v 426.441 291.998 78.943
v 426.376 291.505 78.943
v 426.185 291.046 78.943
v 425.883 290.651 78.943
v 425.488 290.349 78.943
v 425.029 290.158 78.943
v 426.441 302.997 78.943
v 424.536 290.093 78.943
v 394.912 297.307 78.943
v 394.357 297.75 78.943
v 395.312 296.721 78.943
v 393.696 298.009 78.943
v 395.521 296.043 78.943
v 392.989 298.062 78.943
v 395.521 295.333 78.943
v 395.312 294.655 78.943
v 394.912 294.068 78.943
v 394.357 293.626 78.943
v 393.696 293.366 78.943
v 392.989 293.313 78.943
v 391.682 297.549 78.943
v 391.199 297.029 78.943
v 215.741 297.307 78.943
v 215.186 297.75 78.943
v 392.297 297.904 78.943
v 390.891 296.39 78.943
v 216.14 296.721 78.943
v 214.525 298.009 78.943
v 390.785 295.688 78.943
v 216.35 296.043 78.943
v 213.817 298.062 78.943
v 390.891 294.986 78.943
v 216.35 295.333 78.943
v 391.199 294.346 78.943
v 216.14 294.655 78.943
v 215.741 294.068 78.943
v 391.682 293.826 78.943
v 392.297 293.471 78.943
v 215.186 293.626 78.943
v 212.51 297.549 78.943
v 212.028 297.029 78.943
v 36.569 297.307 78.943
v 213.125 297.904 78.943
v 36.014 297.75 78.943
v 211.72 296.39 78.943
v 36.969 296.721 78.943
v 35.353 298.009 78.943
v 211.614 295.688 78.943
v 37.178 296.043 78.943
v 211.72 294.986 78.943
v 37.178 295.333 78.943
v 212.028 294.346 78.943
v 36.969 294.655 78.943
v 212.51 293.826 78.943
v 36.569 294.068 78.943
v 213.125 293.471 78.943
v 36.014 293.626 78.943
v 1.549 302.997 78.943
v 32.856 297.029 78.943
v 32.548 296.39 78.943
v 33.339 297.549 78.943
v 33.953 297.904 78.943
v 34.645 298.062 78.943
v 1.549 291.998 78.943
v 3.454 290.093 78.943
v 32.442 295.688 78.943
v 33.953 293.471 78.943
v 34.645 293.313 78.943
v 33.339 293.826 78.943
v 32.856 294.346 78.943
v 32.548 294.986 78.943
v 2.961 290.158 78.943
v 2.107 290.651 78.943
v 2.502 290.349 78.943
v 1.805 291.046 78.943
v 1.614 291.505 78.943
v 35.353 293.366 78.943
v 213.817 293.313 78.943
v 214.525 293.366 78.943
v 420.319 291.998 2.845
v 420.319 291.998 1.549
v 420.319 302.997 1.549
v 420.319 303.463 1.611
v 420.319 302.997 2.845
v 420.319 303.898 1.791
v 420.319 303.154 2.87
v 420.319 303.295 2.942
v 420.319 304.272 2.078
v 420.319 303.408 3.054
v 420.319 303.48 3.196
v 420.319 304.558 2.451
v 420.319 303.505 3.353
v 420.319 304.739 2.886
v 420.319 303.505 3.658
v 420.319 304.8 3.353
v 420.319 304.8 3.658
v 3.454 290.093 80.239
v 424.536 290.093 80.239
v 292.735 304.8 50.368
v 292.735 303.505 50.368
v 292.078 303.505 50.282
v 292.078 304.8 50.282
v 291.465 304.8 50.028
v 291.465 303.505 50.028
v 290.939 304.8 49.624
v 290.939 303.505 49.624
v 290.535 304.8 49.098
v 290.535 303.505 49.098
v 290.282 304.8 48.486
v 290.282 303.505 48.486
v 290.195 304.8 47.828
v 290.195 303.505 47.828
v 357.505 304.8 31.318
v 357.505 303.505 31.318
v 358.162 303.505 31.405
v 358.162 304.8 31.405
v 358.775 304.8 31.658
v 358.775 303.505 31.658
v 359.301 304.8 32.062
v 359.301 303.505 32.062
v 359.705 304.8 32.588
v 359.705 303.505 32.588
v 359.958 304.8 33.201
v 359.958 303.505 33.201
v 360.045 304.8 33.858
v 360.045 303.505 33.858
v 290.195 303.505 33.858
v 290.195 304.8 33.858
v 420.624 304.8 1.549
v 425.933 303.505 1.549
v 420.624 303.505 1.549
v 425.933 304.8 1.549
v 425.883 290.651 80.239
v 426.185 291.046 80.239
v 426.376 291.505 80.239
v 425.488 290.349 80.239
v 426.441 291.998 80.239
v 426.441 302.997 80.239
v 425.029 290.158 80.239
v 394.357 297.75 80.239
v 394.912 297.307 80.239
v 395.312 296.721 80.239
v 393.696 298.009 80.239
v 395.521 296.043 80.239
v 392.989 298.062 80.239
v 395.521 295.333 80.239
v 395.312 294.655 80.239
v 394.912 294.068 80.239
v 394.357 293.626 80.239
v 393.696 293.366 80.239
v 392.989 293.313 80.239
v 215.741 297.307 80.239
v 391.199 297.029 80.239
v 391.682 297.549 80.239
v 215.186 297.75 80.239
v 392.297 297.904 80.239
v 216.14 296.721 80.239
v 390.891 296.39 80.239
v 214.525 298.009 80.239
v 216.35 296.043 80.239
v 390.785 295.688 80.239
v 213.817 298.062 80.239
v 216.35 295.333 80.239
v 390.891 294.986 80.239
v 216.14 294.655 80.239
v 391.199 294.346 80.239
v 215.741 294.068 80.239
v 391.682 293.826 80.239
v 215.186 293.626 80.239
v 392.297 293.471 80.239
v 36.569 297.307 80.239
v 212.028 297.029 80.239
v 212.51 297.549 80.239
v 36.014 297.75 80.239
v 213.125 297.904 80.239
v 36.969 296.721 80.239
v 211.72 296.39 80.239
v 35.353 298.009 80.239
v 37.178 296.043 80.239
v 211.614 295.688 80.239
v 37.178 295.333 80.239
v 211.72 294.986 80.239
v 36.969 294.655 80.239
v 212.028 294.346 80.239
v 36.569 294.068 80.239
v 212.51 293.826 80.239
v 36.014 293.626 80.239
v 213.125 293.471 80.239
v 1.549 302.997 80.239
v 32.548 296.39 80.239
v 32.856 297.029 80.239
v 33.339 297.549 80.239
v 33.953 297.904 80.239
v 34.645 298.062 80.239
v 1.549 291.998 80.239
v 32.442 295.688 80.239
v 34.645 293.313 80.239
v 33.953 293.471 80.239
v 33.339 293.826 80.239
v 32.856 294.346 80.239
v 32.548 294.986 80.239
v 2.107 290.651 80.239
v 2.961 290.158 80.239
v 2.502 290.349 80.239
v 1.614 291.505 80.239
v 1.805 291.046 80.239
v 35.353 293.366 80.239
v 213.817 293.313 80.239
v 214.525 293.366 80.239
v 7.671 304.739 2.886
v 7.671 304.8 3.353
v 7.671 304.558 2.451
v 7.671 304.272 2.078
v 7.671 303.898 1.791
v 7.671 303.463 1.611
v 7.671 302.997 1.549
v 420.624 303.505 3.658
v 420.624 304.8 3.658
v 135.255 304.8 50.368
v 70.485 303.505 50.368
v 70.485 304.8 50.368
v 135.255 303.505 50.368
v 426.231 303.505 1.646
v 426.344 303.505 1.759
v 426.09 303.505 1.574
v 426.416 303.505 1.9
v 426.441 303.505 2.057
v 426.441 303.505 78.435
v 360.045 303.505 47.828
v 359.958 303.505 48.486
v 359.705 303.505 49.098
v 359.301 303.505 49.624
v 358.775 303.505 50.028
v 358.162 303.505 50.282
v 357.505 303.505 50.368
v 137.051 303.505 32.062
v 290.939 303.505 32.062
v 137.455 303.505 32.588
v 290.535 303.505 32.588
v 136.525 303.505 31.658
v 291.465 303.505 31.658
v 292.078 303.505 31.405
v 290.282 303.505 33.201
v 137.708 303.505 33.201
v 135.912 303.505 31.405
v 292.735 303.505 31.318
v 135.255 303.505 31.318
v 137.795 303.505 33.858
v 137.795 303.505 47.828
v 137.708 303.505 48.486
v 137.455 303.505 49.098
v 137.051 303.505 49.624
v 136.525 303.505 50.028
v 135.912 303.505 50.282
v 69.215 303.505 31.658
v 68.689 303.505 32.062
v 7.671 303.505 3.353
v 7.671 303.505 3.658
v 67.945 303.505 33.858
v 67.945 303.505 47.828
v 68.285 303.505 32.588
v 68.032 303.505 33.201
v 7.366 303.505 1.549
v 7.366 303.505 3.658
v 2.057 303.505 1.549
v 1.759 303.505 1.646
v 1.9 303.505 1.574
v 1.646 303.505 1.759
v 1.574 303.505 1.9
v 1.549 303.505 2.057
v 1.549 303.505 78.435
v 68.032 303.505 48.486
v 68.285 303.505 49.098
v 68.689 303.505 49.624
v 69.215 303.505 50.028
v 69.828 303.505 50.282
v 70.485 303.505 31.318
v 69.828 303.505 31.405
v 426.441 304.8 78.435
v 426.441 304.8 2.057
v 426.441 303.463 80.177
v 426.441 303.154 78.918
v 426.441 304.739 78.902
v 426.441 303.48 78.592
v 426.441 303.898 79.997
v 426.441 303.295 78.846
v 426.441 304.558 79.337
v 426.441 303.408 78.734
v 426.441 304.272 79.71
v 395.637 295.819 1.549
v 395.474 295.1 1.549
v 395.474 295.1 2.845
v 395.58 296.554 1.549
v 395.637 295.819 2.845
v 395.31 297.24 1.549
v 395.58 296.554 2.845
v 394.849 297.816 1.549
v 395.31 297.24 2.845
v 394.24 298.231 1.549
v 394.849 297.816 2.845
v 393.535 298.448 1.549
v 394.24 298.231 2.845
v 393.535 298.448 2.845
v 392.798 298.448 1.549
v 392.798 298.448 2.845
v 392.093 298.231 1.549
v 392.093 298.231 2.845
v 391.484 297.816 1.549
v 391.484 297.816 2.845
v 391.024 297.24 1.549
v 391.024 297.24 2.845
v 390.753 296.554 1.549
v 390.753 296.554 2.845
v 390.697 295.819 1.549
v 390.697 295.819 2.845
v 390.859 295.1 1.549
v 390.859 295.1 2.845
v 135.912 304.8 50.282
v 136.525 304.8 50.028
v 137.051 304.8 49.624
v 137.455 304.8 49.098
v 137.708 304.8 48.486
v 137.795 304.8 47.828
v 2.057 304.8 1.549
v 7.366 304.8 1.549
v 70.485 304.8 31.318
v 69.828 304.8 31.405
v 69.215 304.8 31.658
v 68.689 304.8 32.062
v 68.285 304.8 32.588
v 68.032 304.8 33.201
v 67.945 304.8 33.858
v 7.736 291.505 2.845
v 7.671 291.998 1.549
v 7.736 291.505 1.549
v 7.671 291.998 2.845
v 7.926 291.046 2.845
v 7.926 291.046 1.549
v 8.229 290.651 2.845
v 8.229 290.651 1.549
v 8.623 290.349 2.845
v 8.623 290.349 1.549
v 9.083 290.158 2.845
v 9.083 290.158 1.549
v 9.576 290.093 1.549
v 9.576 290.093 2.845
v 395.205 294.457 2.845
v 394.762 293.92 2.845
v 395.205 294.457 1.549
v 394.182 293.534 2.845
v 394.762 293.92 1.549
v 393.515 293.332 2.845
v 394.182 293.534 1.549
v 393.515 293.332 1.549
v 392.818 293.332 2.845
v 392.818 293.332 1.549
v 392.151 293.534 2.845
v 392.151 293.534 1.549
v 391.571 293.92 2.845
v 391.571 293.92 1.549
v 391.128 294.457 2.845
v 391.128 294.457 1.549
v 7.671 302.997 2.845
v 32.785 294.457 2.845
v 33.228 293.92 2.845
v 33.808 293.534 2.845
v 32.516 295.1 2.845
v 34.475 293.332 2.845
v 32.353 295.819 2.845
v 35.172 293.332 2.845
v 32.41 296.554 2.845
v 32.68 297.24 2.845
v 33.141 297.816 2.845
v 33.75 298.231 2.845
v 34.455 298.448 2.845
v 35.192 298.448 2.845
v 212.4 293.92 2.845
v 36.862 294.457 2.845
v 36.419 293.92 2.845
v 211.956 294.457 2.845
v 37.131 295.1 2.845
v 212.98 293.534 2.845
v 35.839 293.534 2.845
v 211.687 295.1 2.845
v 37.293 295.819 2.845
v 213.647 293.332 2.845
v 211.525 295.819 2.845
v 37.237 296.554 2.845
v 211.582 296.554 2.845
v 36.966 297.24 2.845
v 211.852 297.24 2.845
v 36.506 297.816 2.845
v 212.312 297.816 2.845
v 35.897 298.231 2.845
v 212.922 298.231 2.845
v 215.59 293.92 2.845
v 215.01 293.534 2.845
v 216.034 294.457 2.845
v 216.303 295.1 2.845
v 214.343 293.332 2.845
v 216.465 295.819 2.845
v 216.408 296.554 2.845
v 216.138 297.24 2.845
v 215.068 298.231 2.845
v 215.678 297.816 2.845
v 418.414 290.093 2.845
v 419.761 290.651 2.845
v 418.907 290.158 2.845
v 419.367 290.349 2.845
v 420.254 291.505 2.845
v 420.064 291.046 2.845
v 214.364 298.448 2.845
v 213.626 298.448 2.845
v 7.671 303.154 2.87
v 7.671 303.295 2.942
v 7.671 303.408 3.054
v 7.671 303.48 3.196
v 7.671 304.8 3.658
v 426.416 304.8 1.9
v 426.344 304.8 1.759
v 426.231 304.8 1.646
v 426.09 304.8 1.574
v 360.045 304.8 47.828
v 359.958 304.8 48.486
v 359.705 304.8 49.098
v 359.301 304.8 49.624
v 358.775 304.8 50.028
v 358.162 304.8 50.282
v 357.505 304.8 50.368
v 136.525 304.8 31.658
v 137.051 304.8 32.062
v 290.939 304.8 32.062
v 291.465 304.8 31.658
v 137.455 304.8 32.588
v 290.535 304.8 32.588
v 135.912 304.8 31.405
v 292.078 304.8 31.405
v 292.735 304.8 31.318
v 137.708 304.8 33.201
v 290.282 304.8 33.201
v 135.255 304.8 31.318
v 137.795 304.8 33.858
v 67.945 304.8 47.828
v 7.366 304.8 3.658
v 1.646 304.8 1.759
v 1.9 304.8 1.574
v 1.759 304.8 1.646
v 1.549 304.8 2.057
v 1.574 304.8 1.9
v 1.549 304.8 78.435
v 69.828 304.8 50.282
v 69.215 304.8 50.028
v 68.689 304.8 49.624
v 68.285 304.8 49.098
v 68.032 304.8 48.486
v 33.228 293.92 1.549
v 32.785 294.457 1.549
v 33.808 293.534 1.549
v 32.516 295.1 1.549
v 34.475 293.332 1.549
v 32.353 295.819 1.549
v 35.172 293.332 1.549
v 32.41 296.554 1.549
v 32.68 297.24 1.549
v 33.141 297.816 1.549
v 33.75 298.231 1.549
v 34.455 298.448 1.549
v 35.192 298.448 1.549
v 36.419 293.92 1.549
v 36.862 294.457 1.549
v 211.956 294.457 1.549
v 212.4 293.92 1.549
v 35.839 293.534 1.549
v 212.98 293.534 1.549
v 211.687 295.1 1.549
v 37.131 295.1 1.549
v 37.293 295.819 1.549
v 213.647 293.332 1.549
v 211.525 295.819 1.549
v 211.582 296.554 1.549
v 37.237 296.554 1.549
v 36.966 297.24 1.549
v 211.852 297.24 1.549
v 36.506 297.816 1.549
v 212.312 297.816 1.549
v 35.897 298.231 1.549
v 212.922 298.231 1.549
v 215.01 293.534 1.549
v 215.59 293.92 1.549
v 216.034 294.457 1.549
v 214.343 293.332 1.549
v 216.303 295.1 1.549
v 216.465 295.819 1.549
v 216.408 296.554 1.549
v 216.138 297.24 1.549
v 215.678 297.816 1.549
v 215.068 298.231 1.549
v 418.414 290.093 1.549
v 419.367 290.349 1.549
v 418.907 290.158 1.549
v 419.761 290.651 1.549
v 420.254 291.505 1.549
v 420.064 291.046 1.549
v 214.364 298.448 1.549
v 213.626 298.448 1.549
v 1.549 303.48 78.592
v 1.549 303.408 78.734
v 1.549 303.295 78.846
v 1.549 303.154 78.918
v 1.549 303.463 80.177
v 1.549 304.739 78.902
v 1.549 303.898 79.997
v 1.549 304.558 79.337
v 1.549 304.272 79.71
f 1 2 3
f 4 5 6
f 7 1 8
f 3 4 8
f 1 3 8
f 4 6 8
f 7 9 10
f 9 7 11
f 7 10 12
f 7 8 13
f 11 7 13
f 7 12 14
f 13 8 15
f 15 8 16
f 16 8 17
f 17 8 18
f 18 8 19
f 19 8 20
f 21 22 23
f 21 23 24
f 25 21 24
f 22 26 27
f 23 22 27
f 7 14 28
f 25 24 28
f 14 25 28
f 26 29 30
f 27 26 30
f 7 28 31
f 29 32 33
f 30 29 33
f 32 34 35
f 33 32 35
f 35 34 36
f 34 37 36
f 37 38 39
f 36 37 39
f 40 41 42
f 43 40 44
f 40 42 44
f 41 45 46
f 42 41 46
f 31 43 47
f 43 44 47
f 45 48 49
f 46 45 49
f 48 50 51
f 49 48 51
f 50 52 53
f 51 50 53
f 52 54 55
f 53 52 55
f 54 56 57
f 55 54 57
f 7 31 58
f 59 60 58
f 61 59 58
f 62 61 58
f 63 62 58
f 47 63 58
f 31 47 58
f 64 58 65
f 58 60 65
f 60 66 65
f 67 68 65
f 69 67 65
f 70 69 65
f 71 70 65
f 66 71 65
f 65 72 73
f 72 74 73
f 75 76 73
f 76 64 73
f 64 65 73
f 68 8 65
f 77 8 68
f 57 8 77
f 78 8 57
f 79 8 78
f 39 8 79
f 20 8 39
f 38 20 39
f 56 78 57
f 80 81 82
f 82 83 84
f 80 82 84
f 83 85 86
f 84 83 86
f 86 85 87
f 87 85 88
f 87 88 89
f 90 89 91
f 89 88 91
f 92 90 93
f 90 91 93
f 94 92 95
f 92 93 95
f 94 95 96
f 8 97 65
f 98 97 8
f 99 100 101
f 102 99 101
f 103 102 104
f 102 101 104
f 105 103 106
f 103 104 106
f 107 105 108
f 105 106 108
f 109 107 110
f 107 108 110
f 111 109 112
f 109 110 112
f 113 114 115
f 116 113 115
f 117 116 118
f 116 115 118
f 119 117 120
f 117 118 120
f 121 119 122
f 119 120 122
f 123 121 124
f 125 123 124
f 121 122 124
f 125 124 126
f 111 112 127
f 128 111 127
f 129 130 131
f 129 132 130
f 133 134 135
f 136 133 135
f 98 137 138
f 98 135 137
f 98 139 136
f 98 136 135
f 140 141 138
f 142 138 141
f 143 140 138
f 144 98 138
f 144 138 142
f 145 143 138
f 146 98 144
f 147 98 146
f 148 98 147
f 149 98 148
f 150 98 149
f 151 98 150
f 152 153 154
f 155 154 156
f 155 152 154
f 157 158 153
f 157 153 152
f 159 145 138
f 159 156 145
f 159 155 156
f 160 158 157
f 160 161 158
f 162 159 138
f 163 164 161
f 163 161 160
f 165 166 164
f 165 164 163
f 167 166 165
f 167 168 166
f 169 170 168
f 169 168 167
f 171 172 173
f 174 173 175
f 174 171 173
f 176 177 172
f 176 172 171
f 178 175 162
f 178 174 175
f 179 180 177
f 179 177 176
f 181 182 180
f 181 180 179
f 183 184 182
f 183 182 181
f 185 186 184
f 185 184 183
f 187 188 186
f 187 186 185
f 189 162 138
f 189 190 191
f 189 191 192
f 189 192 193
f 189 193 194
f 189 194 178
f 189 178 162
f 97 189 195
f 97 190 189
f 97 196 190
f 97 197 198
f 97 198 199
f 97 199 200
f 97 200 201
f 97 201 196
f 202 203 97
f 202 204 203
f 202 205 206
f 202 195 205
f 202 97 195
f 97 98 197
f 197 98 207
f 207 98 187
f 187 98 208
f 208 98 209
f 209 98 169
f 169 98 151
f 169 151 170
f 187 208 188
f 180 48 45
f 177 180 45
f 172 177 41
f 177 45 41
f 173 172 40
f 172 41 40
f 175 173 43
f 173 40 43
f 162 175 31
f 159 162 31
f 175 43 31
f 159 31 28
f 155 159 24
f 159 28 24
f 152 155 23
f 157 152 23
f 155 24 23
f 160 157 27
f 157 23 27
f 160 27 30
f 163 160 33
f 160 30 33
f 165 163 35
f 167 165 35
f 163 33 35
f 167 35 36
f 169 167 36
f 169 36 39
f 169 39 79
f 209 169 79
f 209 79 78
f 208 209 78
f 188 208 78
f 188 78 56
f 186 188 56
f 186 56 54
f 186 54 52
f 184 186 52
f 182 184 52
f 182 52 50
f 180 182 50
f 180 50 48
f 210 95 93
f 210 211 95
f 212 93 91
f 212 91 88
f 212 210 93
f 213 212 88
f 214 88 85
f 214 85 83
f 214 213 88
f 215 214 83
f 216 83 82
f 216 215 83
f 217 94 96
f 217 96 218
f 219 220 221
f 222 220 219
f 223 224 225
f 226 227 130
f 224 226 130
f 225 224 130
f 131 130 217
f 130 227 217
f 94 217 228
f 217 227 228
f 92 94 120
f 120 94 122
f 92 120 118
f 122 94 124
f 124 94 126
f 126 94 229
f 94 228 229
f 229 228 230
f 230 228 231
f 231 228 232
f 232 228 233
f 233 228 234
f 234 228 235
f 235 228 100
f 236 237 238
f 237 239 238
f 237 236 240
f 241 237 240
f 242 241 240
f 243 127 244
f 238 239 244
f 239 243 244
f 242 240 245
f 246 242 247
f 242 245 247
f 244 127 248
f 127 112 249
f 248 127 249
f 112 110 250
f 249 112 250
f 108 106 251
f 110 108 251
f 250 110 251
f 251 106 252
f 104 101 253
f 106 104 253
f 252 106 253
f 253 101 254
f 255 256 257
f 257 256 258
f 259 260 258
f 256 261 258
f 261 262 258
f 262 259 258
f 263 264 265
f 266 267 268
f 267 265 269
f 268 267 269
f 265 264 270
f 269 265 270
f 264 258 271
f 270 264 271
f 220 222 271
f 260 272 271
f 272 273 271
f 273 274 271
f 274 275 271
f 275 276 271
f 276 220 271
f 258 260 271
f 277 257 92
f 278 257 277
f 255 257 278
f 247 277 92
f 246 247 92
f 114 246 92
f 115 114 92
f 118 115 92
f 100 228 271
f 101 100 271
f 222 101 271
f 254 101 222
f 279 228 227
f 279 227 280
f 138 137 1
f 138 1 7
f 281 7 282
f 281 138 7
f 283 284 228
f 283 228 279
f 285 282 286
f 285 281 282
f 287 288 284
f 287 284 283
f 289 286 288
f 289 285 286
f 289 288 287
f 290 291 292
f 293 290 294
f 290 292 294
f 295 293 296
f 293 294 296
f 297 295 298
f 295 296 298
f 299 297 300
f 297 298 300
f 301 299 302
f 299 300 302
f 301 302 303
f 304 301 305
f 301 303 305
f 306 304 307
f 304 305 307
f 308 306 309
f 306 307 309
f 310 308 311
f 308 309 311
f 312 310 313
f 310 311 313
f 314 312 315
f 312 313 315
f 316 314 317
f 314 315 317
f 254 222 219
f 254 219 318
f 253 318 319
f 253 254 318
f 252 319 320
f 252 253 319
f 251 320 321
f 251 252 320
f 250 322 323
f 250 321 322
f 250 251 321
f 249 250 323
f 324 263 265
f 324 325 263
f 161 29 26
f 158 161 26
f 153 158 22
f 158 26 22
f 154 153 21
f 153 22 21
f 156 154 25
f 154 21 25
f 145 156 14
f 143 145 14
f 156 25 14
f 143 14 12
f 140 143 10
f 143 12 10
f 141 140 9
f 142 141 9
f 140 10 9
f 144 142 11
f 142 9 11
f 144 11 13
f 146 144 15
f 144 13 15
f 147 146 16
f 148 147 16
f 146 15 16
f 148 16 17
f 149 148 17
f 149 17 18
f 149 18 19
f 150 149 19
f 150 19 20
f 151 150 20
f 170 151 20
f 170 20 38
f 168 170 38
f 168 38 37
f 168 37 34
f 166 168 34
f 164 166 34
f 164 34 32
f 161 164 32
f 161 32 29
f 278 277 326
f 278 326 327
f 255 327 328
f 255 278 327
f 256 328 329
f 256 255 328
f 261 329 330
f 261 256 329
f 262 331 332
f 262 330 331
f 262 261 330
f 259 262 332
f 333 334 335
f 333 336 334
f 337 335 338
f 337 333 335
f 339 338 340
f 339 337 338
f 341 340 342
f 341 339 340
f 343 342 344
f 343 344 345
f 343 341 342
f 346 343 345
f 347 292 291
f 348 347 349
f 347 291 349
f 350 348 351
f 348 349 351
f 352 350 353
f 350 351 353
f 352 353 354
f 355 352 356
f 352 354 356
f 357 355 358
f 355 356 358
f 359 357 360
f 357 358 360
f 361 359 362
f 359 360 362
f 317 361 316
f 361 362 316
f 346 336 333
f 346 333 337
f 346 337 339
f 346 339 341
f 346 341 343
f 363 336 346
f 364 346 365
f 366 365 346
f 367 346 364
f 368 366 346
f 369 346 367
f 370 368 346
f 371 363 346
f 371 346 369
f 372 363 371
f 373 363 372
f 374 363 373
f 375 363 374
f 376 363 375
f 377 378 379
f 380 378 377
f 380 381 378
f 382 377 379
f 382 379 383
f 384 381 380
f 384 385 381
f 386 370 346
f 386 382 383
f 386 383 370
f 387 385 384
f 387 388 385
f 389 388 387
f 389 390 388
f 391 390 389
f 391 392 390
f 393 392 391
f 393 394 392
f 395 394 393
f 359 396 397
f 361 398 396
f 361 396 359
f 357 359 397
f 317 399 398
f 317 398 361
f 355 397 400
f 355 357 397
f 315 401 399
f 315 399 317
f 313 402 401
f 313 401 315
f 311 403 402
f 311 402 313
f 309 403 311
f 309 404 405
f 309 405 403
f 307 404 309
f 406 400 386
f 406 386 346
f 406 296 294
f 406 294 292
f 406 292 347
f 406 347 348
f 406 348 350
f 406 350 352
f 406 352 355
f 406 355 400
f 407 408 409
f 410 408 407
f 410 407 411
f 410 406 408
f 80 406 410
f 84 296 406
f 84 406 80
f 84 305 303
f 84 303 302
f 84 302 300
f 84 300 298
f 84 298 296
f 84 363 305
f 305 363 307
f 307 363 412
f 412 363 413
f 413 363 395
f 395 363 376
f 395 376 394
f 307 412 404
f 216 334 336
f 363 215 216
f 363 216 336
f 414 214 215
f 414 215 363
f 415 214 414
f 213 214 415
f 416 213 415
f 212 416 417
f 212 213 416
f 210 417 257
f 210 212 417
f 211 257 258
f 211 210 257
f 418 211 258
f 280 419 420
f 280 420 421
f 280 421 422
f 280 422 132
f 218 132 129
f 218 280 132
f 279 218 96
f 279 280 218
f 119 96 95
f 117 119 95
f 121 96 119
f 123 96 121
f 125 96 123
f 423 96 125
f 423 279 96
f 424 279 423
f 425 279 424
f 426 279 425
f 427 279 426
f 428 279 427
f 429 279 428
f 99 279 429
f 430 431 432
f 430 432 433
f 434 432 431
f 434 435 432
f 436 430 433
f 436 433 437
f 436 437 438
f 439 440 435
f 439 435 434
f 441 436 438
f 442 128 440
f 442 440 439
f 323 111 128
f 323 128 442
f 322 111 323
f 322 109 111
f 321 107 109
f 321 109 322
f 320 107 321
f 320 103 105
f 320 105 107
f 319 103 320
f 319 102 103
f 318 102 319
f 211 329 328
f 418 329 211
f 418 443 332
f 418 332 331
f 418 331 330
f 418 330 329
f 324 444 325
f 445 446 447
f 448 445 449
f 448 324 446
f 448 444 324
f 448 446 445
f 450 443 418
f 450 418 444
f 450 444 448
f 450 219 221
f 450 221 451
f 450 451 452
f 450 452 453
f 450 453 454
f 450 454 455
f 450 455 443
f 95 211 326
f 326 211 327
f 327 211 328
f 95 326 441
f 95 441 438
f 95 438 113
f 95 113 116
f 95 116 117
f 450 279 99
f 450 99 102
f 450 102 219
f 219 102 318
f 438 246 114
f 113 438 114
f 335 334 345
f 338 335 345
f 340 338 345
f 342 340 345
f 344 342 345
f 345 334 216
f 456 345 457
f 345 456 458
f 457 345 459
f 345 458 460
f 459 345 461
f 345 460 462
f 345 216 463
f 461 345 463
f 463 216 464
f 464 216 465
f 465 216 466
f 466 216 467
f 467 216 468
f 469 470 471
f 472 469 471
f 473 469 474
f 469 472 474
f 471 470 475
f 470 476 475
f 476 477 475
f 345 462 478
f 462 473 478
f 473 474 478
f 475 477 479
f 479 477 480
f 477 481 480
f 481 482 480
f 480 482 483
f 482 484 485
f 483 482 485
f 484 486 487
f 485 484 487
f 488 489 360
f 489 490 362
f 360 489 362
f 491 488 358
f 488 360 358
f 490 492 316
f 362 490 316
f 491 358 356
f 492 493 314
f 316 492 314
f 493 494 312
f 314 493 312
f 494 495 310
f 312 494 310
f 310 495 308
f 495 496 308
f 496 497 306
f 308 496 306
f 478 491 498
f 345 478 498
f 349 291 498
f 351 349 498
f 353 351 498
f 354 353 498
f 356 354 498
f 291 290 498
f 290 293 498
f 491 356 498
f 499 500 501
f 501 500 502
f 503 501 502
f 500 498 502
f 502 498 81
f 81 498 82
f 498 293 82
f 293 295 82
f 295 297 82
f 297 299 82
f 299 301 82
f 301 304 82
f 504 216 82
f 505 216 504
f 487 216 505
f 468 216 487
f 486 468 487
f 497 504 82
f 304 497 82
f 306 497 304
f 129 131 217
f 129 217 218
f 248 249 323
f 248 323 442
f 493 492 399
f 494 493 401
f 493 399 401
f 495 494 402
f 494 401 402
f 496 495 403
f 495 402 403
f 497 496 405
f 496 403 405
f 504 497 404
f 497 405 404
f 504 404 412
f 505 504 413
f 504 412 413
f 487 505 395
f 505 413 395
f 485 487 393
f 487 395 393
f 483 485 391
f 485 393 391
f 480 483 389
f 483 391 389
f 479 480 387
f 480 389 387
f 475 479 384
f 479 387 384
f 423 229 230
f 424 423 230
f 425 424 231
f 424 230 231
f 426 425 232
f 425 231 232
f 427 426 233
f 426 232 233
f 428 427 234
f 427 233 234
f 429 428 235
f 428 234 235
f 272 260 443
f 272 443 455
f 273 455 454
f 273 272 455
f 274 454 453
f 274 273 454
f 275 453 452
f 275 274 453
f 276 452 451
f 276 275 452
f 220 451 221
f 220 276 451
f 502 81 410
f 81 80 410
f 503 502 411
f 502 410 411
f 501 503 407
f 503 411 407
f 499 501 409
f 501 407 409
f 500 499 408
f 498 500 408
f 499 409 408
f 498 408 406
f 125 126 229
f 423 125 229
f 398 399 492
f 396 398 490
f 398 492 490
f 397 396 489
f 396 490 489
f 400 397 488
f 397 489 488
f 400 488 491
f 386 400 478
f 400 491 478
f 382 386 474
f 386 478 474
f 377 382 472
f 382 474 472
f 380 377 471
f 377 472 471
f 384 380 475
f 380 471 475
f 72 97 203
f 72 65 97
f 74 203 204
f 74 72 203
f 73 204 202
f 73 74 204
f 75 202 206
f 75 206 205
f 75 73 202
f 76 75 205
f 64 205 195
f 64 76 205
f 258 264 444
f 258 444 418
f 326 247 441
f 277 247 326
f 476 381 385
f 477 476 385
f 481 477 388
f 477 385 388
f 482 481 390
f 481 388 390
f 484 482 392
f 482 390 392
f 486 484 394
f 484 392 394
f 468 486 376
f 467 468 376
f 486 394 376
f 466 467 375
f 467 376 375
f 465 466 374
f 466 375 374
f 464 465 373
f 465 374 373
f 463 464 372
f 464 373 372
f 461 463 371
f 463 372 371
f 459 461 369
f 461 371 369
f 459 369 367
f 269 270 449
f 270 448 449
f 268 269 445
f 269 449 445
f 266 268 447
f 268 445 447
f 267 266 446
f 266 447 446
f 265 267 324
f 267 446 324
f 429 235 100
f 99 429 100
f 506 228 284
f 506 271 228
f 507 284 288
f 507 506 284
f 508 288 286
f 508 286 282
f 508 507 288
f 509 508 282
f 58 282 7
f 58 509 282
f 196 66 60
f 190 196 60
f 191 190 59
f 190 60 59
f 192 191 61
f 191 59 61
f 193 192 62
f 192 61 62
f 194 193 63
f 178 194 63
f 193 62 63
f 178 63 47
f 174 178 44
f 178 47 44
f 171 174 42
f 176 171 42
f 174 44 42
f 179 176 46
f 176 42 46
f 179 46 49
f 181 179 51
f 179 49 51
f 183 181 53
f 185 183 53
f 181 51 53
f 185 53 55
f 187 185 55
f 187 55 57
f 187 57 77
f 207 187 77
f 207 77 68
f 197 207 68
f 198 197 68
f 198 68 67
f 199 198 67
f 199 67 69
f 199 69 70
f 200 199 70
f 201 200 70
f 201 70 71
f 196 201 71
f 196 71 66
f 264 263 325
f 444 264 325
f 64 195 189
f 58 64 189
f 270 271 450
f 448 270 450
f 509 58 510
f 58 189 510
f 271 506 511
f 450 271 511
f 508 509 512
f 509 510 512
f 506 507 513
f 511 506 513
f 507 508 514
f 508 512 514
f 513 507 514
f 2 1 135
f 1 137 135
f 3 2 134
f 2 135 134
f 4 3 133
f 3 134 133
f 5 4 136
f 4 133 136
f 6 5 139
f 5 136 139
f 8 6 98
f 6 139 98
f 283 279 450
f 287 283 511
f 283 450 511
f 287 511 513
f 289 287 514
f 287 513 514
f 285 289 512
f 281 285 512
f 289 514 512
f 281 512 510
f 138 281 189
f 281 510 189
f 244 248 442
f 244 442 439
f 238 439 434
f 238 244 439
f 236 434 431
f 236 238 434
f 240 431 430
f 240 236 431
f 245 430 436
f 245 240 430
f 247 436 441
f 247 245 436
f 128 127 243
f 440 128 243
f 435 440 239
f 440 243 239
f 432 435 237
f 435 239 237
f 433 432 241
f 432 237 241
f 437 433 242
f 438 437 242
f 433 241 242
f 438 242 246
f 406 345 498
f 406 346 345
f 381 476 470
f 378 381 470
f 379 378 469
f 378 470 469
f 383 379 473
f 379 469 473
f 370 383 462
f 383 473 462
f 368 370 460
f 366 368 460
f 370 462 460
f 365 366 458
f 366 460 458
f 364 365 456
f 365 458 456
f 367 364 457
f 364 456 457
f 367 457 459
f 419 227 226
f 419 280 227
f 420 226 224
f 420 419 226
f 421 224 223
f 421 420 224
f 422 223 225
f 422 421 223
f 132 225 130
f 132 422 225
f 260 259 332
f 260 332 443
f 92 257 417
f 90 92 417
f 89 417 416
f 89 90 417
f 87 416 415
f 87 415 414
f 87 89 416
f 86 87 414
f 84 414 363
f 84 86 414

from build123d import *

# Parameters (mm, degrees)
BOSS_EXTRUDE1_DEPTH                = 12.9032
BOSS_EXTRUDE2_DEPTH                = 0.508
CUT_EXTRUDE1_DEPTH                 = 12.9032
BOSS_EXTRUDE3_DEPTH                = 1.2954
CUT_EXTRUDE2_DEPTH                 = 0.508
BOSS_EXTRUDE4_DEPTH                = 0.3048
BOSS_EXTRUDE5_DEPTH                = 0.508
SKETCH8_W                          = 412.6484
SKETCH8_H                          = 0.508
CUT_EXTRUDE3_DEPTH                 = 0.3048
SKETCH9_W                          = 412.6484
SKETCH9_H                          = 1.8034
BOSS_EXTRUDE6_DEPTH                = 1.2954
SKETCH10_W                         = 412.6484
SKETCH10_H                         = 0.508
CUT_EXTRUDE4_DEPTH                 = 0.508
SKETCH11_W                         = 412.6484
SKETCH11_H                         = 1.2954
BOSS_EXTRUDE7_DEPTH                = 12.9032
SKETCH12_W                         = 5.8166
SKETCH12_H                         = 1.2954
BOSS_EXTRUDE8_DEPTH                = 2.1082
SKETCH13_W                         = 5.8166
SKETCH13_H                         = 1.2954
BOSS_EXTRUDE9_DEPTH                = 2.1082
HOLE1_D                            = 4.953
HOLE1_DEPTH                        = 1.2954
F_3_16_0_1875_DIAMETER_HOLE1_D     = 4.7625
F_3_16_0_1875_DIAMETER_HOLE1_DEPTH = 78.6892
FILLET1_R                          = 0.508
FILLET2_R                          = 1.8034
FILLET3_R                          = 1.904999999
CUT_EXTRUDE5_DEPTH                 = 435.13094631


with BuildPart() as part:
    # Sketch1 → Boss-Extrude1 (new body)
    with BuildSketch(Plane.XZ.offset(-290.0934)):
        Polygon((426.4406, 80.2386), (1.5494, 80.2386), (1.5494, 78.9432), (1.5494, 78.4352), (1.5494, 3.6576), (426.4406, 3.6576), (426.4406, 78.4352), (426.4406, 78.9432), align=None)
    extrude(amount=-BOSS_EXTRUDE1_DEPTH)

    # Sketch2 → Boss-Extrude2 (add)
    with BuildSketch(Plane(origin=(0, 302.9966, 0), x_dir=(-1, 0, 0), z_dir=(0, 1, 0))):
        Polygon((-1.5494, 3.6576), (-426.4406, 3.6576), (-426.4406, 78.4352), (-426.4406, 78.943205), (-426.4406, 80.2386), (-1.5494, 80.2386), (-1.5494, 78.943205), (-1.5494, 78.4352), align=None)
    extrude(amount=BOSS_EXTRUDE2_DEPTH)

    # Sketch3 → Cut-Extrude1 (cut)
    with BuildSketch(Plane.XZ.offset(-290.0934)):
        Polygon((1.5494, 3.6576), (426.4406, 3.6576), (426.4406, 78.4352), (426.4406, 78.9432), (1.5494, 78.9432), (1.5494, 78.4352), align=None)
    extrude(amount=-CUT_EXTRUDE1_DEPTH, mode=Mode.SUBTRACT)

    # Sketch4 → Boss-Extrude3 (add)
    with BuildSketch(Plane(origin=(0, 303.5046, 0), x_dir=(-1, 0, 0), z_dir=(0, 1, 0))):
        Polygon((-1.5494, 3.6576), (-426.4406, 3.6576), (-426.4406, 78.4352), (-426.4406, 80.2386), (-1.5494, 80.2386), (-1.5494, 78.4352), align=None)
    extrude(amount=BOSS_EXTRUDE3_DEPTH)

    # Sketch5 → Cut-Extrude2 (cut)
    with BuildSketch(Plane.XZ.offset(-302.9966)):
        Polygon((1.5494, 3.6576), (426.4406, 3.6576), (426.4406, 78.4352), (426.4406, 78.9432), (1.5494, 78.9432), (1.5494, 78.4352), align=None)
    extrude(amount=-CUT_EXTRUDE2_DEPTH, mode=Mode.SUBTRACT)

    # Sketch6 → Boss-Extrude4 (add)
    with BuildSketch(Plane(origin=(0, 0, 3.6576), x_dir=(-1, 0, 0), z_dir=(0, 0, -1))):
        Polygon((-420.3192, 302.9966), (-420.3192, 303.5046), (-420.3192, 304.8), (-7.6708, 304.8), (-7.6708, 303.5046), (-7.6708, 302.9966), align=None)
    extrude(amount=BOSS_EXTRUDE4_DEPTH)

    # Sketch7 → Boss-Extrude5 (add)
    with BuildSketch(Plane(origin=(0, 0, 3.3528), x_dir=(-1, 0, 0), z_dir=(0, 0, -1))):
        Polygon((-420.3192, 302.9966), (-420.3192, 303.5046), (-420.3192, 304.8), (-7.6708, 304.8), (-7.6708, 303.504605), (-7.6708, 302.9966), align=None)
    extrude(amount=BOSS_EXTRUDE5_DEPTH)

    # Sketch8 → Cut-Extrude3 (cut)
    with BuildSketch(Plane.XY.offset(3.6576)):
        with Locations((213.995, 303.2506)):
            Rectangle(SKETCH8_W, SKETCH8_H)
    extrude(amount=-CUT_EXTRUDE3_DEPTH, mode=Mode.SUBTRACT)

    # Sketch9 → Boss-Extrude6 (add)
    with BuildSketch(Plane(origin=(0, 0, 2.8448), x_dir=(-1, 0, 0), z_dir=(0, 0, -1))):
        with Locations((-213.995, 303.8983)):
            Rectangle(SKETCH9_W, SKETCH9_H)
    extrude(amount=BOSS_EXTRUDE6_DEPTH)

    # Sketch10 → Cut-Extrude4 (cut)
    with BuildSketch(Plane.XY.offset(3.3528)):
        with Locations((213.995, 303.2506)):
            Rectangle(SKETCH10_W, SKETCH10_H)
    extrude(amount=-CUT_EXTRUDE4_DEPTH, mode=Mode.SUBTRACT)

    # Sketch11 → Boss-Extrude7 (add)
    with BuildSketch(Plane.XZ.offset(-302.9966)):
        with Locations((213.995, 2.1971)):
            Rectangle(SKETCH11_W, SKETCH11_H)
    extrude(amount=BOSS_EXTRUDE7_DEPTH)

    # Sketch12 → Boss-Extrude8 (add)
    with BuildSketch(Plane(origin=(0, 0, 3.6576), x_dir=(-1, 0, 0), z_dir=(0, 0, -1))):
        with Locations((-4.4577, 304.1523)):
            Rectangle(SKETCH12_W, SKETCH12_H)
    extrude(amount=BOSS_EXTRUDE8_DEPTH)

    # Sketch13 → Boss-Extrude9 (add)
    with BuildSketch(Plane(origin=(0, 0, 3.6576), x_dir=(-1, 0, 0), z_dir=(0, 0, -1))):
        with Locations((-423.5323, 304.1523)):
            Rectangle(SKETCH13_W, SKETCH13_H)
    extrude(amount=BOSS_EXTRUDE9_DEPTH)

    # Hole1
    with Locations(Plane(origin=(0, 0, 1.5494), x_dir=(-1, 0, 0), z_dir=(0, 0, -1))):
        with Locations((-213.995, 295.9989), (-393.1666, 295.9989), (-34.8234, 295.9989)):
            Hole(HOLE1_D / 2, depth=HOLE1_DEPTH)

    # 3/16 (0.1875) Diameter Hole1
    with Locations(Plane.XY.offset(80.2386)):
        with Locations((34.8234, 295.68775), (213.995, 295.68775), (393.1666, 295.68775)):
            Hole(F_3_16_0_1875_DIAMETER_HOLE1_D / 2, depth=F_3_16_0_1875_DIAMETER_HOLE1_DEPTH)

    # Fillet1
    fillet1_edges = [part.edges().sort_by_distance(p)[0] for p in [
        (213.995, 303.5046, 2.8448),
        (1.5494, 304.1523, 1.5494),
        (426.4406, 304.1523, 1.5494),
        (213.995, 303.5046, 78.9432),
    ]]
    fillet(fillet1_edges, radius=FILLET1_R)

    # Fillet2
    fillet2_edges = [part.edges().sort_by_distance(p)[0] for p in [
        (213.995, 304.8, 1.5494),
        (213.995, 304.8, 80.2386),
    ]]
    fillet(fillet2_edges, radius=FILLET2_R)

    # Fillet3
    fillet3_edges = [part.edges().sort_by_distance(p)[0] for p in [
        (420.3192, 290.0934, 2.1971),
        (7.6708, 290.0934, 2.1971),
        (426.4406, 290.0934, 79.5909),
        (1.5494, 290.0934, 79.5909),
    ]]
    fillet(fillet3_edges, radius=FILLET3_R)

    # Sketch18 → Cut-Extrude5 (cut, through all)
    with BuildSketch(Plane.XZ.offset(-303.5046)):
        with BuildLine():
            Line((357.505, 50.3682), (292.735, 50.3682))
            ThreePointArc((292.735, 50.3682), (290.938948776, 49.624251224), (290.195, 47.8282))
            Line((290.195, 47.8282), (290.195, 33.8582))
            ThreePointArc((290.195, 33.8582), (290.938948776, 32.062148776), (292.735, 31.3182))
            Line((292.735, 31.3182), (357.505, 31.3182))
            ThreePointArc((357.505, 31.3182), (359.301051224, 32.062148776), (360.045, 33.8582))
            Line((360.045, 33.8582), (360.045, 47.8282))
            ThreePointArc((360.045, 47.8282), (359.301051224, 49.624251224), (357.505, 50.3682))
        make_face()
        with BuildLine():
            Line((137.795, 47.8282), (137.795, 33.8582))
            ThreePointArc((137.795, 33.8582), (137.051051224, 32.062148776), (135.255, 31.3182))
            Line((135.255, 31.3182), (70.485, 31.3182))
            ThreePointArc((70.485, 31.3182), (68.688948776, 32.062148776), (67.945, 33.8582))
            Line((67.945, 33.8582), (67.945, 47.8282))
            ThreePointArc((67.945, 47.8282), (68.688948776, 49.624251224), (70.485, 50.3682))
            Line((70.485, 50.3682), (135.255, 50.3682))
            ThreePointArc((135.255, 50.3682), (137.051051224, 49.624251224), (137.795, 47.8282))
        make_face()
    extrude(amount=-CUT_EXTRUDE5_DEPTH, mode=Mode.SUBTRACT)


solid = part.part
